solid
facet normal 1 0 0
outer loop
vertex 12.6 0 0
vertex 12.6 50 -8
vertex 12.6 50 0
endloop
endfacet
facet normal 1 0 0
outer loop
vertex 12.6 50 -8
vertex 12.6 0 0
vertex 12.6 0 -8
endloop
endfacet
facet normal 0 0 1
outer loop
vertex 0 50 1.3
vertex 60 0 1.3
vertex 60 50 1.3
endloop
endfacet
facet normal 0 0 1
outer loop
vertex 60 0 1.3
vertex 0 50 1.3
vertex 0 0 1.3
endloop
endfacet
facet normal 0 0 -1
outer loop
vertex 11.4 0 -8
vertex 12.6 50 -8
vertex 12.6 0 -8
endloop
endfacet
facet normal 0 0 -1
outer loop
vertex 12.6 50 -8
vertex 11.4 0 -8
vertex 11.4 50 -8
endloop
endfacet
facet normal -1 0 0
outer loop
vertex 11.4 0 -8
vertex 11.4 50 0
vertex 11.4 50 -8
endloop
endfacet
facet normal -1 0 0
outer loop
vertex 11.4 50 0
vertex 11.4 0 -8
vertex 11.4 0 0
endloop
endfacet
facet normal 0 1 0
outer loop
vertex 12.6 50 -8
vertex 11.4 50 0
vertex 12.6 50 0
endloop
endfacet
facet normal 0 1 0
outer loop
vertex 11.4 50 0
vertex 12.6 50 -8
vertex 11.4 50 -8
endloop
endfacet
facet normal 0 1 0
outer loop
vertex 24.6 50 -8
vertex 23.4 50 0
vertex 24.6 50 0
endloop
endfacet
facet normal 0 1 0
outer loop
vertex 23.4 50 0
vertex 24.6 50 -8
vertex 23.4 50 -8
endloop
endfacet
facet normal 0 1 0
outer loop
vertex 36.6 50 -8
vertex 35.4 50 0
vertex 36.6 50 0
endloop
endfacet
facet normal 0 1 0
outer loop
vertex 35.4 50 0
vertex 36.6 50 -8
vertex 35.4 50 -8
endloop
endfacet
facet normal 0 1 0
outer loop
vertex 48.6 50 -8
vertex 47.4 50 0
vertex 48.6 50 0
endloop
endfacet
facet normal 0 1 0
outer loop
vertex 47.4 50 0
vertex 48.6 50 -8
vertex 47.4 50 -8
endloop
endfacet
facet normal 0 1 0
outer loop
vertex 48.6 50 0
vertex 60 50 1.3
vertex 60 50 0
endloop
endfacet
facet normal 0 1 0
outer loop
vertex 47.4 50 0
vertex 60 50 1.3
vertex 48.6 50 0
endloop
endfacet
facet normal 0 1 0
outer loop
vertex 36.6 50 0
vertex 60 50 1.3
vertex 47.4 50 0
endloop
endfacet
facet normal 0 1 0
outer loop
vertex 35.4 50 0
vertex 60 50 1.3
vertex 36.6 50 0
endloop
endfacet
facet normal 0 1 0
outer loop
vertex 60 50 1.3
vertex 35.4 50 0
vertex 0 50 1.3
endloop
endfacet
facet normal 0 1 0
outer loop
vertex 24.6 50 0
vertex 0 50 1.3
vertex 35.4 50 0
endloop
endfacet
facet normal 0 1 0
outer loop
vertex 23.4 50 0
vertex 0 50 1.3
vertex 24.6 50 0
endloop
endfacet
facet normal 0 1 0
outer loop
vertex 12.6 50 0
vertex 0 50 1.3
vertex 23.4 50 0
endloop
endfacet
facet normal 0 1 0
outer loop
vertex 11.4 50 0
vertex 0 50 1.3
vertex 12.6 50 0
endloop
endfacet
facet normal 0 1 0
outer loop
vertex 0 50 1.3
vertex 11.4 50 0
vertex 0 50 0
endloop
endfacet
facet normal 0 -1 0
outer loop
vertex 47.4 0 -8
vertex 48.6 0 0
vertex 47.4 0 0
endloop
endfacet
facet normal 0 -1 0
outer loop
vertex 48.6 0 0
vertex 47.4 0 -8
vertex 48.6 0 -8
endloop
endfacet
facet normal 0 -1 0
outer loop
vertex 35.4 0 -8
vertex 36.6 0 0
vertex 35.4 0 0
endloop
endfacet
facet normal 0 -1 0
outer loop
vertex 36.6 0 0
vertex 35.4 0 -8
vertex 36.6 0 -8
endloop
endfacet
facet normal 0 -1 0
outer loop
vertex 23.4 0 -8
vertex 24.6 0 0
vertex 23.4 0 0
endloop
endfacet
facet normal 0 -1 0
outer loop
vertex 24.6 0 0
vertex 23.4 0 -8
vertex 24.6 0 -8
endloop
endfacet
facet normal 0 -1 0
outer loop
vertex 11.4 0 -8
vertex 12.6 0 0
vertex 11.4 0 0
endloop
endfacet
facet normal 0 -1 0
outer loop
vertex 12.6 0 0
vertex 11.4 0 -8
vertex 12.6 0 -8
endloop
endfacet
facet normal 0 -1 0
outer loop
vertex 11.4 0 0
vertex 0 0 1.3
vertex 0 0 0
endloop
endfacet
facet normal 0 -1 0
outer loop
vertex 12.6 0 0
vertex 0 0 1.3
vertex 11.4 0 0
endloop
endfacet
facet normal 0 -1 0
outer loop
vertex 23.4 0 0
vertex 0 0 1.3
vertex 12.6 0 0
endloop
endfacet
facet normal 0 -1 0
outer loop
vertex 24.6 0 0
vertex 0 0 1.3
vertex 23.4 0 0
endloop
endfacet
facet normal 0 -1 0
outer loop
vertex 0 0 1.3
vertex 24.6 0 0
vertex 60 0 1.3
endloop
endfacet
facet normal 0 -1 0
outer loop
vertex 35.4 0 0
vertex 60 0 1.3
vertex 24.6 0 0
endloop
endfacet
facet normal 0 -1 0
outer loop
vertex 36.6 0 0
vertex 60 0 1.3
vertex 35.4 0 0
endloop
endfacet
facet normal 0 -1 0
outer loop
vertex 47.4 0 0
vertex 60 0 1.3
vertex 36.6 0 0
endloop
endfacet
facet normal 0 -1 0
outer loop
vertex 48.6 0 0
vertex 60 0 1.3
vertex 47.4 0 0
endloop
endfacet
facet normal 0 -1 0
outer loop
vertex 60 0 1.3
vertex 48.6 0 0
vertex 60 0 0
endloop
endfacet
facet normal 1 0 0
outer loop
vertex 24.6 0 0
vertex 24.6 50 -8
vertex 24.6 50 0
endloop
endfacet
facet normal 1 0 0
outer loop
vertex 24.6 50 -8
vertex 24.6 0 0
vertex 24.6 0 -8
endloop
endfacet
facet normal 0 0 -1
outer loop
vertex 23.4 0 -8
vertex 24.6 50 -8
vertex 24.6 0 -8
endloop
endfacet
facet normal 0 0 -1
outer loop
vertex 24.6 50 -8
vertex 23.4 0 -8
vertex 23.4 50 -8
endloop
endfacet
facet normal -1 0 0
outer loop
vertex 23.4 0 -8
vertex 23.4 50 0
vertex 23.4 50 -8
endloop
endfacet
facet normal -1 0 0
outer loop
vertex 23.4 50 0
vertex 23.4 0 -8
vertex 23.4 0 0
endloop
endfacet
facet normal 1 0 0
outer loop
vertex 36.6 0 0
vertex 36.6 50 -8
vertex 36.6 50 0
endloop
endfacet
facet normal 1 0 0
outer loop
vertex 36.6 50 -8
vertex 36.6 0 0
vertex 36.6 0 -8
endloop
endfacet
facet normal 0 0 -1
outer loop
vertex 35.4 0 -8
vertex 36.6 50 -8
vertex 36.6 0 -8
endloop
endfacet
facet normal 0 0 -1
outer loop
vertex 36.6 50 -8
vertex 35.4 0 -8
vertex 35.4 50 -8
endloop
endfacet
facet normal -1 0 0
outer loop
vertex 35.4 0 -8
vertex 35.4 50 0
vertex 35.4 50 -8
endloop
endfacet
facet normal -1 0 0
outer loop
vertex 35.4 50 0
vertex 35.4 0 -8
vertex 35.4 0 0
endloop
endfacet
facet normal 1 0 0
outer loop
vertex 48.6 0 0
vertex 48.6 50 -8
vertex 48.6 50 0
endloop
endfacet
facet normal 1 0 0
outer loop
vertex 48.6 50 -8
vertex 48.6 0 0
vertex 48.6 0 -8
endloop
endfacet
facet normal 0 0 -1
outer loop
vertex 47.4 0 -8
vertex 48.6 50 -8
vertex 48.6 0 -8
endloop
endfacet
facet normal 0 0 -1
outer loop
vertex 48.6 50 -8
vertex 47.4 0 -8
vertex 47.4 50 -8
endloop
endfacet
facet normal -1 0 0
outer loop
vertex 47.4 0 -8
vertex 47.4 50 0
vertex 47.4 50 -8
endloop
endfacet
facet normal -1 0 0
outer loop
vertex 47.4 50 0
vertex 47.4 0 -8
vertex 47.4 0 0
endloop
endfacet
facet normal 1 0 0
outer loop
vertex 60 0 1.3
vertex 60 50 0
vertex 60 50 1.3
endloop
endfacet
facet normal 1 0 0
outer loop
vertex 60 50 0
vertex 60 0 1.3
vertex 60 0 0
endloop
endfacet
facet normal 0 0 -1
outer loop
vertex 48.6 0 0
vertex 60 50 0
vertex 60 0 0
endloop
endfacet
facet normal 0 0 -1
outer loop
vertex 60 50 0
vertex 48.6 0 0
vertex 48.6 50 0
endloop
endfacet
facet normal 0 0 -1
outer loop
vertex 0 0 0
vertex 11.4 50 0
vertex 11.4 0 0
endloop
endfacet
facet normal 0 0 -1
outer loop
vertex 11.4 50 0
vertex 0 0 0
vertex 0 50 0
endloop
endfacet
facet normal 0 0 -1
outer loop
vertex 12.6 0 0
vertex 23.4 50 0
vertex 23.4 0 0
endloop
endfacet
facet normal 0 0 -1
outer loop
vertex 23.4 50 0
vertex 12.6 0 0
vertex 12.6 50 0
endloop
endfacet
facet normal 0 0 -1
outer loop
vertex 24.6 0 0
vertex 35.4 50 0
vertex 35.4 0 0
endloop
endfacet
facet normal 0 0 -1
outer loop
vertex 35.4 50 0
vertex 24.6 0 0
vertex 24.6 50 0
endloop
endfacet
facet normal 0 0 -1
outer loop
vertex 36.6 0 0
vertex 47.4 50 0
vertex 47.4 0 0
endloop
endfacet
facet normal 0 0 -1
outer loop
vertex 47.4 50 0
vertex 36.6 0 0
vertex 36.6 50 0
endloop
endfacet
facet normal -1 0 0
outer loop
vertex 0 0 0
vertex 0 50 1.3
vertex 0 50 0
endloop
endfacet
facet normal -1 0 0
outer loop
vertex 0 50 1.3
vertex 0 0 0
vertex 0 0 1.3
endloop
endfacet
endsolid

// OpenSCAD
$fn = 32;

// ----------------------------------------------------------------------
// Ribbed panel: 1.3 mm panel
// ----------------------------------------------------------------------

// --- parameters (mm) ---
panel_l = 60;             // panel length, X
panel_w = 50;             // panel width, Y
panel_t = 1.3;            // panel thickness, Z
rib_t = 1.2;              // rib thickness
rib_h = 8;                // rib height below the panel
ribs = 4;                 // number of ribs

total_h = panel_t + rib_h;  // overall height

union() {
  cube([panel_l, panel_w, panel_t]);
  for (i = [1 : ribs])
    translate([i * panel_l / (ribs + 1) - rib_t / 2, 0, -rib_h])
      cube([rib_t, panel_w, rib_h + panel_t]);
}
